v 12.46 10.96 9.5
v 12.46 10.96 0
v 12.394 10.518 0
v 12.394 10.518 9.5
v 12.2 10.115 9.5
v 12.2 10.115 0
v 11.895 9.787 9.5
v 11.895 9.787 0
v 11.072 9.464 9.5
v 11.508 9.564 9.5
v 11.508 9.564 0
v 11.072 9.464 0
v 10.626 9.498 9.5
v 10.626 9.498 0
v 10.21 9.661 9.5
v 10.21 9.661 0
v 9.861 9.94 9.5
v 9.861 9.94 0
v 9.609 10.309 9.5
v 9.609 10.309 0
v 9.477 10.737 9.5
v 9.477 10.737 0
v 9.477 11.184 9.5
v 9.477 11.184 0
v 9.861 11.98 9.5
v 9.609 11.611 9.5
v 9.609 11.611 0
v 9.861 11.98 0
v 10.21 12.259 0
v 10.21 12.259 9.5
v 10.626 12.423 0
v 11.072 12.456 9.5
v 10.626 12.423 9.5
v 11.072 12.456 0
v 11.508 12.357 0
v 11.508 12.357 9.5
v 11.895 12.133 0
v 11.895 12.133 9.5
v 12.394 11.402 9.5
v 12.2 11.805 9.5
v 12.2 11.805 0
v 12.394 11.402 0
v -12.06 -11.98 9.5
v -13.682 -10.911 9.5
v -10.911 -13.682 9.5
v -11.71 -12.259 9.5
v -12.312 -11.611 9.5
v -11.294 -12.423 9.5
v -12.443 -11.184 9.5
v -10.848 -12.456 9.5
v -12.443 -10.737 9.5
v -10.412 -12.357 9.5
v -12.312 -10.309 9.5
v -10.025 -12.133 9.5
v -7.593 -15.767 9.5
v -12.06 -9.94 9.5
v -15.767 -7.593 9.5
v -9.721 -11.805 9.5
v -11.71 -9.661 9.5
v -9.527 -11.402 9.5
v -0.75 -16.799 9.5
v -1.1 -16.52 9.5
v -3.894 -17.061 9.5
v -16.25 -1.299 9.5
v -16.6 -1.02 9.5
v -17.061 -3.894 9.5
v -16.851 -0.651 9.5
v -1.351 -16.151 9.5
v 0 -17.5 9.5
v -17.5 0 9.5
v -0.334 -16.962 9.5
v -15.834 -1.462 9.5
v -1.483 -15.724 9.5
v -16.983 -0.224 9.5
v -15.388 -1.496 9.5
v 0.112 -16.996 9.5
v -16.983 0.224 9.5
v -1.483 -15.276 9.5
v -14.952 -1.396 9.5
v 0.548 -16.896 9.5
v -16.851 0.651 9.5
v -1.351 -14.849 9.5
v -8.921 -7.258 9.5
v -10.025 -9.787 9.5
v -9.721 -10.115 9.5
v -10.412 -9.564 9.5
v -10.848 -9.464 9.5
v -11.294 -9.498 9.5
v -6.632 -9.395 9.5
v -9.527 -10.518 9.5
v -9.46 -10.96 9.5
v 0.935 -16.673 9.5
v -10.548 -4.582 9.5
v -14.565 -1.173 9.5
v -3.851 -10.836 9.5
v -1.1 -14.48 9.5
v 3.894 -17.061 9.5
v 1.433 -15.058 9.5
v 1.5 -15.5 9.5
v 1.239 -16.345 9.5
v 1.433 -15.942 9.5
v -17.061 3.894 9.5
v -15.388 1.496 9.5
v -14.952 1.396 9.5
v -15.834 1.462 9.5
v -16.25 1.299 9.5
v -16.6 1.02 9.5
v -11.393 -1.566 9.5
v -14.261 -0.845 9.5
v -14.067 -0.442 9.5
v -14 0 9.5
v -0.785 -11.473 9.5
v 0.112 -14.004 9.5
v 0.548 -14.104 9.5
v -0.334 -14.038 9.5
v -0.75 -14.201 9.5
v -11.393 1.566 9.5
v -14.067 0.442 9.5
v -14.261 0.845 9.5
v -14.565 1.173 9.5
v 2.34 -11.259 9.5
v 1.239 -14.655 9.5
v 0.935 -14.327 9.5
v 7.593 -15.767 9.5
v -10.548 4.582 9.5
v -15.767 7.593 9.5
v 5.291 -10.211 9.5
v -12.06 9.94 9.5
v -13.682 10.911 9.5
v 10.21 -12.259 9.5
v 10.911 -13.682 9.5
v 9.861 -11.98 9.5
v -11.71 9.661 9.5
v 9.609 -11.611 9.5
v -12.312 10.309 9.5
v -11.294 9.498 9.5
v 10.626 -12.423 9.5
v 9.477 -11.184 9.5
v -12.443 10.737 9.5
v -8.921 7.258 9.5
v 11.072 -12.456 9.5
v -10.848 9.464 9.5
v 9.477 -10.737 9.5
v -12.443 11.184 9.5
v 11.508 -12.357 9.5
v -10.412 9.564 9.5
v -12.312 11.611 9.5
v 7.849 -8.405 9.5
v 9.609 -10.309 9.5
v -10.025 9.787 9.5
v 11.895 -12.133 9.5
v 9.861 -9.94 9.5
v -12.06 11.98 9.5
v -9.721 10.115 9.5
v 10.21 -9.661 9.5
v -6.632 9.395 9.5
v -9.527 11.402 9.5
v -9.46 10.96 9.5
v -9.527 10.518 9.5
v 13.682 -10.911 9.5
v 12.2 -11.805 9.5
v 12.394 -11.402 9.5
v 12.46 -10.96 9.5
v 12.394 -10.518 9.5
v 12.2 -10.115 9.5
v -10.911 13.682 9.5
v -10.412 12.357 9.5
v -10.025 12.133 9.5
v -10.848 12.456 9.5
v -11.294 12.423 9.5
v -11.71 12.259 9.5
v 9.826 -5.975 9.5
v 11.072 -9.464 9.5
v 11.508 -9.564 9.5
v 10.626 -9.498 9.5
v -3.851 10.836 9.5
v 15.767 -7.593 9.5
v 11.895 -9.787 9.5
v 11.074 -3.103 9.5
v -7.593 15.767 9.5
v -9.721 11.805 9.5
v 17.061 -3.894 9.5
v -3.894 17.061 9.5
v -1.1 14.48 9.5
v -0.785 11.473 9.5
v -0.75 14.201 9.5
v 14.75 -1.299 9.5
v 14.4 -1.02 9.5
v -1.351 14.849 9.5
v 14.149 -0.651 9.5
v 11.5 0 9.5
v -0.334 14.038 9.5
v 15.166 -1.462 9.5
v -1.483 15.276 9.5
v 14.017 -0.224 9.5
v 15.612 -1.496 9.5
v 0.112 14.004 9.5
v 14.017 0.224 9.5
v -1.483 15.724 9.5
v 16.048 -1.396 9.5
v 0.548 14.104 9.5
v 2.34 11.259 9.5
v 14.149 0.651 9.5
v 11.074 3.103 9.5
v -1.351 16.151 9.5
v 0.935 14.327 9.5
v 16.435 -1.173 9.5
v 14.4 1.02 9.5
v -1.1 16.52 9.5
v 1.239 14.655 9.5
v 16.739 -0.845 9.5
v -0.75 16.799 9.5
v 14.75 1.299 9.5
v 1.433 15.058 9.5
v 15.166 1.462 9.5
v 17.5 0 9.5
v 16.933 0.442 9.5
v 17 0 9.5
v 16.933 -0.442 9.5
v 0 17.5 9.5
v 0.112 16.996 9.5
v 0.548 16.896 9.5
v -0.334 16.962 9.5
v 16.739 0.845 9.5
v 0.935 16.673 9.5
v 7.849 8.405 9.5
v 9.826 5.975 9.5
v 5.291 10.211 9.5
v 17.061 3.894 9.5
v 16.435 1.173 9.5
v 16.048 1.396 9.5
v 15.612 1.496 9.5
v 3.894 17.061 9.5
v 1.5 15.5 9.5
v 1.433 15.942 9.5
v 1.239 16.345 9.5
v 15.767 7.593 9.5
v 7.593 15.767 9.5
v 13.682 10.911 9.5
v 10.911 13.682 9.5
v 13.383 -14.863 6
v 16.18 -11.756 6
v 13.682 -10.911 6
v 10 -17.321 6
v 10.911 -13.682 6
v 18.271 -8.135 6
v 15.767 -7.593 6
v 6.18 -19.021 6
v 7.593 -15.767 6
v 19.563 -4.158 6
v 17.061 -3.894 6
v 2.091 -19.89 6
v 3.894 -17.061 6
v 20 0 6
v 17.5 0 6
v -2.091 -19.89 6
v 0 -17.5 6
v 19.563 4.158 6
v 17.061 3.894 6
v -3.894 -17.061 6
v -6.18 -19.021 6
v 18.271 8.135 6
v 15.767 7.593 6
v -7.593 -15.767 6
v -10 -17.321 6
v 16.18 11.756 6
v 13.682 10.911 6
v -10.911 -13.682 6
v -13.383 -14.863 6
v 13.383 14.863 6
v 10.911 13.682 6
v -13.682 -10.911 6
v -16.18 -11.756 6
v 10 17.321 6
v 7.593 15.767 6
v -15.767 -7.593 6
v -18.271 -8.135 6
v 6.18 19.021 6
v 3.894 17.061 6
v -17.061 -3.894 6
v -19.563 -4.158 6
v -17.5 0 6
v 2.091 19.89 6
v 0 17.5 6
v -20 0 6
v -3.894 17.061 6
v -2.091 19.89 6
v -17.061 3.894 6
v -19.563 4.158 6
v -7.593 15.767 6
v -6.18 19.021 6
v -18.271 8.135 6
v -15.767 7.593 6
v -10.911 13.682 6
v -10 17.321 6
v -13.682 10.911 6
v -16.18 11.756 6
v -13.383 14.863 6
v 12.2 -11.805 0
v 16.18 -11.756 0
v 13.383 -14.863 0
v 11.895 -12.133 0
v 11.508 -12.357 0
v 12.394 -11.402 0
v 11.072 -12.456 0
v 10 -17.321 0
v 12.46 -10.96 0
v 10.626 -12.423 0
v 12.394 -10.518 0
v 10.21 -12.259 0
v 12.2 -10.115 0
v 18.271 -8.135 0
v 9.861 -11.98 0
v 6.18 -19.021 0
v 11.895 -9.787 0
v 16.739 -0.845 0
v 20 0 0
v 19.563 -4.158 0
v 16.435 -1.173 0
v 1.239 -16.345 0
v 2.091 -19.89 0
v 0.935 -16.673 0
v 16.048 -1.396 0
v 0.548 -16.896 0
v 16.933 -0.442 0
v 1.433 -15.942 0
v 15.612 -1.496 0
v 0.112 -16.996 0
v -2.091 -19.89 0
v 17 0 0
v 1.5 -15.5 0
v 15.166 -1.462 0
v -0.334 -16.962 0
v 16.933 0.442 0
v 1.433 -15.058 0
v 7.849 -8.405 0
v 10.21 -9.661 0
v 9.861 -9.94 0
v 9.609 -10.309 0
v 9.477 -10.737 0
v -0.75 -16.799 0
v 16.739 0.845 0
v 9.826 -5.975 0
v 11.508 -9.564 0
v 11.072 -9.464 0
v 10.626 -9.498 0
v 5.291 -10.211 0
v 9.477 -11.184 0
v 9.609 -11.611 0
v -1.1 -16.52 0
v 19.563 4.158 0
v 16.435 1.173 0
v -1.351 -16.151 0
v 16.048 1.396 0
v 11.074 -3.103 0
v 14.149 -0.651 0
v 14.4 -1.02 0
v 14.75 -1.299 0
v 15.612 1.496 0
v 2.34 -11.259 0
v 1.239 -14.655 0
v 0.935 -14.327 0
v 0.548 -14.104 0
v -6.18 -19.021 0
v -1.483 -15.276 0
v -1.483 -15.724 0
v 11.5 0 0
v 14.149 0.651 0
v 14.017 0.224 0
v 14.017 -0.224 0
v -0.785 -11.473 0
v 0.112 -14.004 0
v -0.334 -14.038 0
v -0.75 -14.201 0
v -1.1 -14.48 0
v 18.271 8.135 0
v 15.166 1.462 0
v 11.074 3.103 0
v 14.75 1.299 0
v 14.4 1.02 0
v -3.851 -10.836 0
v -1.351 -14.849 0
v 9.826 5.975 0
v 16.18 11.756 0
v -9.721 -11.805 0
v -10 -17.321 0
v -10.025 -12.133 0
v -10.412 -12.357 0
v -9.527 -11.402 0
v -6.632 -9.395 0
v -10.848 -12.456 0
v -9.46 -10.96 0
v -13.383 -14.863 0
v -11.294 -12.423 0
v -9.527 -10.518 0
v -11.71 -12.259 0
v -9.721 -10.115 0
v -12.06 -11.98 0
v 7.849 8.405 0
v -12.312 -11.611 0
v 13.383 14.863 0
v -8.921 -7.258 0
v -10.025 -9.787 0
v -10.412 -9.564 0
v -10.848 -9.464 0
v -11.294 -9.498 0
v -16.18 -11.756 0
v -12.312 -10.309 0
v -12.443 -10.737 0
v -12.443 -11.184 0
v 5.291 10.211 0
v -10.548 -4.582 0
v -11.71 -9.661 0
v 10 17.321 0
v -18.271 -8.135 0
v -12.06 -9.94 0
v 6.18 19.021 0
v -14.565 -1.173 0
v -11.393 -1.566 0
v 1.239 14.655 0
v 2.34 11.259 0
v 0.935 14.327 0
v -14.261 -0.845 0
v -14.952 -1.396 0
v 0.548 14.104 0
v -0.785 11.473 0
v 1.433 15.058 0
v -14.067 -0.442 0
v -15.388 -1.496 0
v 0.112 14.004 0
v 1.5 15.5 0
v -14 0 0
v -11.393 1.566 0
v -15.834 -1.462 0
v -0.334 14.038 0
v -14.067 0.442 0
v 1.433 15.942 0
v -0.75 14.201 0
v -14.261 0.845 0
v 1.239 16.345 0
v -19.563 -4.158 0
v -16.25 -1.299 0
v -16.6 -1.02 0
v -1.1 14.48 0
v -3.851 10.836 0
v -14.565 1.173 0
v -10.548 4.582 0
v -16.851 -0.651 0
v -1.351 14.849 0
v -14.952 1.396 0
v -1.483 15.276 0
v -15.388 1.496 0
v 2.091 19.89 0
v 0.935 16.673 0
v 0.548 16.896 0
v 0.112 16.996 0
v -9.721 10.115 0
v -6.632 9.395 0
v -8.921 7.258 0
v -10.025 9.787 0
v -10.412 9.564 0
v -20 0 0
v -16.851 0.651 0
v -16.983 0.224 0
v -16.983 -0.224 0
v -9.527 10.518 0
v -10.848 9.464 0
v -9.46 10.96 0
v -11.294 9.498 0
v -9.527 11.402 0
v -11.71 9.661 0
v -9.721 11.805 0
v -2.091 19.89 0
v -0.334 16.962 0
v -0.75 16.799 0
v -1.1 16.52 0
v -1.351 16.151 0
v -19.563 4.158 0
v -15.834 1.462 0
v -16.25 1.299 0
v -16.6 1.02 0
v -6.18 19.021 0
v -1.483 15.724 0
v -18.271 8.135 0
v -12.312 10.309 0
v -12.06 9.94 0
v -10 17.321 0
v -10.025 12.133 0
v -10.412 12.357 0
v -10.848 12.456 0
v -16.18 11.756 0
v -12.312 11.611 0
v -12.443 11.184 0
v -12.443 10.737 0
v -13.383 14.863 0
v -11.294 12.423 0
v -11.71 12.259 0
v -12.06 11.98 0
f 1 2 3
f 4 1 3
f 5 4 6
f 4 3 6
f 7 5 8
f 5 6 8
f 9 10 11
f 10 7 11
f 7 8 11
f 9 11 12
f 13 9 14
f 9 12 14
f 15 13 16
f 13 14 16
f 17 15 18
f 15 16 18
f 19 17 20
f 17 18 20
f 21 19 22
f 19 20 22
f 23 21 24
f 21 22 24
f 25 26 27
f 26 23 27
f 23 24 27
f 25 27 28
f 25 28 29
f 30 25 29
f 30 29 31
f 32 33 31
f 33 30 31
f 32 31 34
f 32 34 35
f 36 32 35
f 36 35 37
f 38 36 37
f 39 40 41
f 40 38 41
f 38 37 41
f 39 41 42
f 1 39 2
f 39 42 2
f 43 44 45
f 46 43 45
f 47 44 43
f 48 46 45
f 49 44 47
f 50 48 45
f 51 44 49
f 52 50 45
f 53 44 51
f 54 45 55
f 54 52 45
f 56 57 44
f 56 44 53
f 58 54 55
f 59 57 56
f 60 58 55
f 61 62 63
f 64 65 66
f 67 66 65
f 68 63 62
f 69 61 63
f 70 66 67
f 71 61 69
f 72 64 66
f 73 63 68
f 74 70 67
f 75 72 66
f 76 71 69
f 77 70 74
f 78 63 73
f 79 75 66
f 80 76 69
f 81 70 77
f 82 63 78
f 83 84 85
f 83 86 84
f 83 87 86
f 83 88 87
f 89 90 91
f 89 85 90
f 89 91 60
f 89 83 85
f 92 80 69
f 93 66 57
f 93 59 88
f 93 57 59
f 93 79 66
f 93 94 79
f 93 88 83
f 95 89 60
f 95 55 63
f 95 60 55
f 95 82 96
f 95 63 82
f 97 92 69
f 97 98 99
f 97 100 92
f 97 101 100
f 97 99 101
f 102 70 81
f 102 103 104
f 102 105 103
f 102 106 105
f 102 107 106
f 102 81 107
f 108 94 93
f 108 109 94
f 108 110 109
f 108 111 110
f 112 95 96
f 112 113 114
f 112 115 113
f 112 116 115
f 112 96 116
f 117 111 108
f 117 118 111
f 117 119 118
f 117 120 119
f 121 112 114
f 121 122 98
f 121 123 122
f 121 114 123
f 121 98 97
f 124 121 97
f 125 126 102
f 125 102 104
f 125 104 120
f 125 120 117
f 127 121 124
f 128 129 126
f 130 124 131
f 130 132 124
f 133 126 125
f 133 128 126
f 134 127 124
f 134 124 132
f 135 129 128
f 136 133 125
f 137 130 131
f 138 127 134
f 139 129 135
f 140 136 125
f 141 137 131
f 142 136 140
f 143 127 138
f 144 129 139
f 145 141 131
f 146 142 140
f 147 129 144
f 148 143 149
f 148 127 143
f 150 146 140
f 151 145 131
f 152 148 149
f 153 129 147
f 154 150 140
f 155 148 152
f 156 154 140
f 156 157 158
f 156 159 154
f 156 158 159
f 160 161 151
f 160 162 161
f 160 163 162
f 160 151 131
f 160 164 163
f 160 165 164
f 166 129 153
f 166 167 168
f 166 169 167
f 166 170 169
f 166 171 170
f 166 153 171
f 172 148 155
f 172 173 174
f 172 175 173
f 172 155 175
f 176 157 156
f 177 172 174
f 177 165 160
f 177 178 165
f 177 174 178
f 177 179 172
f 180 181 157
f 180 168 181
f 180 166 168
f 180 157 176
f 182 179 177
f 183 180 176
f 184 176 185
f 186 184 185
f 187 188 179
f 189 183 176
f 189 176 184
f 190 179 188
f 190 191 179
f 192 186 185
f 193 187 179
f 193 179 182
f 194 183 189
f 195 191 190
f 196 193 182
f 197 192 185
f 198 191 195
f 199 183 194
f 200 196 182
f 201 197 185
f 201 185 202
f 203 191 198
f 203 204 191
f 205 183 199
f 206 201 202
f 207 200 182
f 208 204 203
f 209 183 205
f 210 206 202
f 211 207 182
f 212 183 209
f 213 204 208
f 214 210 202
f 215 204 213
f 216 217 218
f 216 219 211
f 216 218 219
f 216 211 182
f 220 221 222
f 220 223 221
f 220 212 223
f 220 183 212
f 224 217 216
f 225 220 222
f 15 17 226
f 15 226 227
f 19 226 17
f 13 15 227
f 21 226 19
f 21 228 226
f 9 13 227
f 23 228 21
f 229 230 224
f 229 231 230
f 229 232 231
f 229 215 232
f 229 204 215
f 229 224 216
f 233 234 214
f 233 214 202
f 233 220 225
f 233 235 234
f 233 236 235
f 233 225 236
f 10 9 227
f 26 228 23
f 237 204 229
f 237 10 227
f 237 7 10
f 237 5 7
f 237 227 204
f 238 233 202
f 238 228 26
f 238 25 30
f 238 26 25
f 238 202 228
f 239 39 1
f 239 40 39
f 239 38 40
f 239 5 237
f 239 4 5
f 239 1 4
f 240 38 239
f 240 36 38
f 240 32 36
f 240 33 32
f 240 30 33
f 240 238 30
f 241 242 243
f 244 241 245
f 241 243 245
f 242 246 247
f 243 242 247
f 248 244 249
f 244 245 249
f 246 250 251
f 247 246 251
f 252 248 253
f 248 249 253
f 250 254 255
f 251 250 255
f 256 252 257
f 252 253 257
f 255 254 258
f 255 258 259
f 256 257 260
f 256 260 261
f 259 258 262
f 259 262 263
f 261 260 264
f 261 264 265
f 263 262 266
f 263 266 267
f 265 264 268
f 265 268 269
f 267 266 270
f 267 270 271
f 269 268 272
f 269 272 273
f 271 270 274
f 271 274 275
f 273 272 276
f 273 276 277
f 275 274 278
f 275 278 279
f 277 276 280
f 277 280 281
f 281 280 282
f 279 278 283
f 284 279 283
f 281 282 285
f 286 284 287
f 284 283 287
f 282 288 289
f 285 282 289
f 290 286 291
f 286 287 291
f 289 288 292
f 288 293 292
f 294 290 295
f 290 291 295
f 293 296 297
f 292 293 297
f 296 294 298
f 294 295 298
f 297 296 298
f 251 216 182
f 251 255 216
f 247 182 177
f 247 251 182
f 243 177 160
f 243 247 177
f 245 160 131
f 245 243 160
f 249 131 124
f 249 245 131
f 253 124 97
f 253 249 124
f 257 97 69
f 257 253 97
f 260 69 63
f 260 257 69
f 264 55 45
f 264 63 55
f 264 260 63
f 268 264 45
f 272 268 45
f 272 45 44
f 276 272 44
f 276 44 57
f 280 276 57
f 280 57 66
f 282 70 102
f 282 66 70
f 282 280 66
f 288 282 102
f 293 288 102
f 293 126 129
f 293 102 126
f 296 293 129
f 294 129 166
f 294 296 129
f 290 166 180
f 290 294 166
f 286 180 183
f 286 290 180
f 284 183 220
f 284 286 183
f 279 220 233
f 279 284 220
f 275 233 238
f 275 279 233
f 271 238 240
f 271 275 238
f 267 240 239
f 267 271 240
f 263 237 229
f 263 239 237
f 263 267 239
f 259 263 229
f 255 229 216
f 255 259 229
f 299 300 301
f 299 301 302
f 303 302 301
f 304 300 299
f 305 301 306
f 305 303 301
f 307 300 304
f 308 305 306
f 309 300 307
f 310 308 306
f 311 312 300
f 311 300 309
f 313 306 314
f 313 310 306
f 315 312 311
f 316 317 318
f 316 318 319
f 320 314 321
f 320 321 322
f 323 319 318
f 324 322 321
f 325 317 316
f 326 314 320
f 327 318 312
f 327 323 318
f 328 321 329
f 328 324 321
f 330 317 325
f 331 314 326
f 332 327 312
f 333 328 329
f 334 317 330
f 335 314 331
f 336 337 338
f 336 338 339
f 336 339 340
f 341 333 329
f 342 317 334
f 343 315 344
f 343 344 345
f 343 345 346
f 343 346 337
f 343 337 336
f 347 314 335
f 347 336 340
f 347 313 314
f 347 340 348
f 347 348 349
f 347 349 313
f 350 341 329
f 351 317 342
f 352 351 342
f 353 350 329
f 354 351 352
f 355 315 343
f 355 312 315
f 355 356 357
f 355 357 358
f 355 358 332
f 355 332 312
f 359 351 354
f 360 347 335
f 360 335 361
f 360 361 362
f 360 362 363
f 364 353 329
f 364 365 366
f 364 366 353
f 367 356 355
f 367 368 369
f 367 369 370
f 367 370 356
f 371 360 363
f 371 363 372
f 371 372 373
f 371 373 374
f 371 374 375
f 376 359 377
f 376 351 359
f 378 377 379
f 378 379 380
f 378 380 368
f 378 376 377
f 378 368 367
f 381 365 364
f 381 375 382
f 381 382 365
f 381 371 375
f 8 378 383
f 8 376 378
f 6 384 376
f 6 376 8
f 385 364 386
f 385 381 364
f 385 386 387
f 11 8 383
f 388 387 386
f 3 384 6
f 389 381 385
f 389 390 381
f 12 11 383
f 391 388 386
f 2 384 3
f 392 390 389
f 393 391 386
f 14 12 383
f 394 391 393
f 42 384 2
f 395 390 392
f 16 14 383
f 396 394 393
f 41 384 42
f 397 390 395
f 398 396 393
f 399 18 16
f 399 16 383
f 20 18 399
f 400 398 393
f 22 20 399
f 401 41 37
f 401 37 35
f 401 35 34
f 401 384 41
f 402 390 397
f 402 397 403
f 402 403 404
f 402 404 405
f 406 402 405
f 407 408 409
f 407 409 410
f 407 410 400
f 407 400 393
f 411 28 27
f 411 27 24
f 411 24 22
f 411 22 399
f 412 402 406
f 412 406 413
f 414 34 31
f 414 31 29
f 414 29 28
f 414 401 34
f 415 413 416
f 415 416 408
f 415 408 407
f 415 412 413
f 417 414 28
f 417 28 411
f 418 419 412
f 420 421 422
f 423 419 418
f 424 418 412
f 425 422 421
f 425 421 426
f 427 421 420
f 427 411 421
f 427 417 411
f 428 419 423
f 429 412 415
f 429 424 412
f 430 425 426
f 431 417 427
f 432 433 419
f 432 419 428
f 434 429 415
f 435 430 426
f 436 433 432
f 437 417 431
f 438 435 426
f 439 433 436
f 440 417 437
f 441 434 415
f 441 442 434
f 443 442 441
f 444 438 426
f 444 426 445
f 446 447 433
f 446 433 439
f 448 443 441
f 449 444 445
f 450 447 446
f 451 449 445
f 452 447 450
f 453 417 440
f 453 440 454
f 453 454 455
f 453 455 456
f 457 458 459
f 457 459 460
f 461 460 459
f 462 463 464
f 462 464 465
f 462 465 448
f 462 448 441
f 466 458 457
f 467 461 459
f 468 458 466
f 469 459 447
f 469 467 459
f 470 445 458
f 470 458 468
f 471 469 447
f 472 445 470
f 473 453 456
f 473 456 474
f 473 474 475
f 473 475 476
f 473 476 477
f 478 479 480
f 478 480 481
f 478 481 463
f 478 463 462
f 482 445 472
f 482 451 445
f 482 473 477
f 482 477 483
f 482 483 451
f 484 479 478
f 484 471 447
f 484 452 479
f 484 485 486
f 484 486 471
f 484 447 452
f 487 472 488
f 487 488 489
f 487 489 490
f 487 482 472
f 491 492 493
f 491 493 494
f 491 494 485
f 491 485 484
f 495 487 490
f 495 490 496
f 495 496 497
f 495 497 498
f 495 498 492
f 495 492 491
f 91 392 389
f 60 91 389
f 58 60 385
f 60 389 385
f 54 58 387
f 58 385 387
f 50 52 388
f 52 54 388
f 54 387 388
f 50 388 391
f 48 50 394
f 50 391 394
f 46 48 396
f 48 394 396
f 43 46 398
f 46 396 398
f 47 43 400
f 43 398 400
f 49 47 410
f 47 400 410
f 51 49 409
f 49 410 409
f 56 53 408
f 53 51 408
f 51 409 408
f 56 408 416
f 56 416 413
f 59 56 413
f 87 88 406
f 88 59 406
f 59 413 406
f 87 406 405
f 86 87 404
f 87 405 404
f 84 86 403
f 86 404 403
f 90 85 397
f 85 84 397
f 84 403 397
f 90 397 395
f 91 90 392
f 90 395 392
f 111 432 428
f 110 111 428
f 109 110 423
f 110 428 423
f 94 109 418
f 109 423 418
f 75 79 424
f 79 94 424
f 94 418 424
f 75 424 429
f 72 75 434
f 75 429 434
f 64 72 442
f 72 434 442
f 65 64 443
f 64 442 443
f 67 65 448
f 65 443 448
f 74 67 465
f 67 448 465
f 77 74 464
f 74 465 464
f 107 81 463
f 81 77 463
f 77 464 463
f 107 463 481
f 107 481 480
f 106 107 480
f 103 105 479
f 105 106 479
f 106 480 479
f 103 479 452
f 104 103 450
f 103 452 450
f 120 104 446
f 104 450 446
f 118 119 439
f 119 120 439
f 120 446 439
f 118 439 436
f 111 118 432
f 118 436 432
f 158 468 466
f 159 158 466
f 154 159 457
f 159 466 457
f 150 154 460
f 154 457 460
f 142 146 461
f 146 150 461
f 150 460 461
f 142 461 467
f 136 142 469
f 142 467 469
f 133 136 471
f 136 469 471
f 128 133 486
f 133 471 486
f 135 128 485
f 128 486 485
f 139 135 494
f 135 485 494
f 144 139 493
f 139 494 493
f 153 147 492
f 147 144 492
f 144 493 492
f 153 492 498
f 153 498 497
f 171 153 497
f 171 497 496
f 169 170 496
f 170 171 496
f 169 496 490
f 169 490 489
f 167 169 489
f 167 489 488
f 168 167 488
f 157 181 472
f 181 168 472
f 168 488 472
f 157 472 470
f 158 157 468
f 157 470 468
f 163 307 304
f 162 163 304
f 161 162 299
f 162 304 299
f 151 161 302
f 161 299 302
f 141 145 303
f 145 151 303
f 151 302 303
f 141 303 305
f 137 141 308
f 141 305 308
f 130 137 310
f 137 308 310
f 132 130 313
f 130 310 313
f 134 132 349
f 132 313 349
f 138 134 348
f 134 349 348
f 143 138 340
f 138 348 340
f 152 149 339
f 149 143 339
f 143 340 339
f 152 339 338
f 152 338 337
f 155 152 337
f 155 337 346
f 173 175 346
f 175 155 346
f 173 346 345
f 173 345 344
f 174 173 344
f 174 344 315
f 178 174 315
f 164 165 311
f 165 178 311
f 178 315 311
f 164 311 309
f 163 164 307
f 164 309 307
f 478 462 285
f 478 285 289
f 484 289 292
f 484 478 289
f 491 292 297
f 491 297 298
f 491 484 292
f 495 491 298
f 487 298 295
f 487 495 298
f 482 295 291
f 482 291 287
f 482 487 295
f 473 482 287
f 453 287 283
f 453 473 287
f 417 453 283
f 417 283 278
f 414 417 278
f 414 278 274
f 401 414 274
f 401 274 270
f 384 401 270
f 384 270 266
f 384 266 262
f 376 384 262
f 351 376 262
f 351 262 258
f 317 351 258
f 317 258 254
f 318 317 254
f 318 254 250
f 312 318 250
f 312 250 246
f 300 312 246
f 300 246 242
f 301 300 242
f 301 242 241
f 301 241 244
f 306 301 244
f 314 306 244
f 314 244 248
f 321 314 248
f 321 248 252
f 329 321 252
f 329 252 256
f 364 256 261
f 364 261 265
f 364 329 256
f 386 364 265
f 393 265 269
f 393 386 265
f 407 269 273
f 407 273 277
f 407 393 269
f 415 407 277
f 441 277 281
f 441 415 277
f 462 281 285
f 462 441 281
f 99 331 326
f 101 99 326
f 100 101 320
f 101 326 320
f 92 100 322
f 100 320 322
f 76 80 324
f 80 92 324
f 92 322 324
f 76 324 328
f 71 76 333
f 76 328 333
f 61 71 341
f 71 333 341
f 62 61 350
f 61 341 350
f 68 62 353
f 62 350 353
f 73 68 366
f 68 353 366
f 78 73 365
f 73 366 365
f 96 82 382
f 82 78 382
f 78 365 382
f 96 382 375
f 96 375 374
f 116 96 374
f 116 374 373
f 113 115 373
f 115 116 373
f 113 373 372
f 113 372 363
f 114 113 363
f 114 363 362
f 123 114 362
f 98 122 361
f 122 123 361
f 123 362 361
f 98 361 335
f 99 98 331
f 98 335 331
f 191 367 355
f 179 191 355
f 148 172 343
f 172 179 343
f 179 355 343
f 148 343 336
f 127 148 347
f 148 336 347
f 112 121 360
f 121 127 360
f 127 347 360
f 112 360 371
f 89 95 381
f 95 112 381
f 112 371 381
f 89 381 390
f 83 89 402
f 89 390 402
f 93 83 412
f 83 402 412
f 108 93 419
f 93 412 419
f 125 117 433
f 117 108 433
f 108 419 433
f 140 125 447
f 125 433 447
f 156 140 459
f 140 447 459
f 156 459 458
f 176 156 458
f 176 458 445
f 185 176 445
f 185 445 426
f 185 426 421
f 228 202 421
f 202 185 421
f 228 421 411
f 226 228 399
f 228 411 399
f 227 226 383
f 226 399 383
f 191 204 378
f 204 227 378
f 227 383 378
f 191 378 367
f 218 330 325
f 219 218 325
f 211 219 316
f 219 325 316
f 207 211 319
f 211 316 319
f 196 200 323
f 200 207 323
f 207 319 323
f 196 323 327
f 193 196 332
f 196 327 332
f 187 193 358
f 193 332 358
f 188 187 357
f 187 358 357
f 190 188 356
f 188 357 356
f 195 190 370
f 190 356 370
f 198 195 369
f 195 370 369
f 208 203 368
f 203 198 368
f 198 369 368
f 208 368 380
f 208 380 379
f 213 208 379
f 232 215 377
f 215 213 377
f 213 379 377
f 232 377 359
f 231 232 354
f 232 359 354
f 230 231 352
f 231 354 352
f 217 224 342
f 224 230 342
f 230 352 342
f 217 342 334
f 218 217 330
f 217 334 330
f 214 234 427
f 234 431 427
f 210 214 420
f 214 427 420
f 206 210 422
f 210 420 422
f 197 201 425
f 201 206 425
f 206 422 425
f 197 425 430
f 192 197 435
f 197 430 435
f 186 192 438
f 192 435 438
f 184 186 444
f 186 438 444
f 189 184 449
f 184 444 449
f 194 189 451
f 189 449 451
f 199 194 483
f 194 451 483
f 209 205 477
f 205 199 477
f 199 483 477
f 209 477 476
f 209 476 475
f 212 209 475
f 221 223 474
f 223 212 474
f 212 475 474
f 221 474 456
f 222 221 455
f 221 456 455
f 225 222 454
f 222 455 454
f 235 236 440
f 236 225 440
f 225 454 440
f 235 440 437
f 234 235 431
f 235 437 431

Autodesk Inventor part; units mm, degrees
ref_plane "YZ Plane" through (0, 0, 0) normal (1, 0, 0) x (0, 1, 0)
ref_plane "XZ Plane" through (0, 0, 0) normal (0, 1, 0) x (-1, 0, 0)
ref_plane "XY Plane" through (0, 0, 0) normal (0, 0, 1) x (1, 0, 0)
sketch "Skizze1" plane through (0, 0, 0) normal (0, 0, 1) x (1, 0, 0)
  circle A0 centre (-15.5, 0) radius 1.5 projected
  circle A1 centre (0, -15.5) radius 1.5 projected
  circle A2 centre (10.9602, 10.9602) radius 1.5 projected
  circle A3 centre (0, 15.5) radius 1.5 projected
  circle A4 centre (15.5, 0) radius 1.5 projected
  circle A5 centre (10.9602, -10.9602) radius 1.5 projected
  circle A6 centre (-10.9602, -10.9602) radius 1.5 projected
  circle A7 centre (-10.9602, 10.9602) radius 1.5 projected
  circle A8 centre (0, 0) radius 11.5 projected
  arc A9 (22.1589, -22.3882) -> (22.1589, 22.3882) centre (0, 0) ccw projected
  arc A10 (22.1589, 22.3882) -> (22.1589, -22.3882) centre (0, 0) ccw projected
  circle A11 centre (0, 0) radius 17.5
  point P0 (0, 0)
  dimension "d0" = 35
extrude "Extrusion1" add sketch "Skizze1" along normal blind 9.5 contours A11
sketch "Skizze2" plane through (0, 0, 0) normal (0, 0, -1) x (-1, 0, 0)
  circle A0 centre (0, 0) radius 17.5 projected
  circle A1 centre (0, 0) radius 20
  point P0 (0, 0)
  dimension "d4" = 40
extrude "Extrusion2" add sketch "Skizze2" against normal blind 6
properties part number "RotGear_spacer" material "ABS-Kunststoff"
